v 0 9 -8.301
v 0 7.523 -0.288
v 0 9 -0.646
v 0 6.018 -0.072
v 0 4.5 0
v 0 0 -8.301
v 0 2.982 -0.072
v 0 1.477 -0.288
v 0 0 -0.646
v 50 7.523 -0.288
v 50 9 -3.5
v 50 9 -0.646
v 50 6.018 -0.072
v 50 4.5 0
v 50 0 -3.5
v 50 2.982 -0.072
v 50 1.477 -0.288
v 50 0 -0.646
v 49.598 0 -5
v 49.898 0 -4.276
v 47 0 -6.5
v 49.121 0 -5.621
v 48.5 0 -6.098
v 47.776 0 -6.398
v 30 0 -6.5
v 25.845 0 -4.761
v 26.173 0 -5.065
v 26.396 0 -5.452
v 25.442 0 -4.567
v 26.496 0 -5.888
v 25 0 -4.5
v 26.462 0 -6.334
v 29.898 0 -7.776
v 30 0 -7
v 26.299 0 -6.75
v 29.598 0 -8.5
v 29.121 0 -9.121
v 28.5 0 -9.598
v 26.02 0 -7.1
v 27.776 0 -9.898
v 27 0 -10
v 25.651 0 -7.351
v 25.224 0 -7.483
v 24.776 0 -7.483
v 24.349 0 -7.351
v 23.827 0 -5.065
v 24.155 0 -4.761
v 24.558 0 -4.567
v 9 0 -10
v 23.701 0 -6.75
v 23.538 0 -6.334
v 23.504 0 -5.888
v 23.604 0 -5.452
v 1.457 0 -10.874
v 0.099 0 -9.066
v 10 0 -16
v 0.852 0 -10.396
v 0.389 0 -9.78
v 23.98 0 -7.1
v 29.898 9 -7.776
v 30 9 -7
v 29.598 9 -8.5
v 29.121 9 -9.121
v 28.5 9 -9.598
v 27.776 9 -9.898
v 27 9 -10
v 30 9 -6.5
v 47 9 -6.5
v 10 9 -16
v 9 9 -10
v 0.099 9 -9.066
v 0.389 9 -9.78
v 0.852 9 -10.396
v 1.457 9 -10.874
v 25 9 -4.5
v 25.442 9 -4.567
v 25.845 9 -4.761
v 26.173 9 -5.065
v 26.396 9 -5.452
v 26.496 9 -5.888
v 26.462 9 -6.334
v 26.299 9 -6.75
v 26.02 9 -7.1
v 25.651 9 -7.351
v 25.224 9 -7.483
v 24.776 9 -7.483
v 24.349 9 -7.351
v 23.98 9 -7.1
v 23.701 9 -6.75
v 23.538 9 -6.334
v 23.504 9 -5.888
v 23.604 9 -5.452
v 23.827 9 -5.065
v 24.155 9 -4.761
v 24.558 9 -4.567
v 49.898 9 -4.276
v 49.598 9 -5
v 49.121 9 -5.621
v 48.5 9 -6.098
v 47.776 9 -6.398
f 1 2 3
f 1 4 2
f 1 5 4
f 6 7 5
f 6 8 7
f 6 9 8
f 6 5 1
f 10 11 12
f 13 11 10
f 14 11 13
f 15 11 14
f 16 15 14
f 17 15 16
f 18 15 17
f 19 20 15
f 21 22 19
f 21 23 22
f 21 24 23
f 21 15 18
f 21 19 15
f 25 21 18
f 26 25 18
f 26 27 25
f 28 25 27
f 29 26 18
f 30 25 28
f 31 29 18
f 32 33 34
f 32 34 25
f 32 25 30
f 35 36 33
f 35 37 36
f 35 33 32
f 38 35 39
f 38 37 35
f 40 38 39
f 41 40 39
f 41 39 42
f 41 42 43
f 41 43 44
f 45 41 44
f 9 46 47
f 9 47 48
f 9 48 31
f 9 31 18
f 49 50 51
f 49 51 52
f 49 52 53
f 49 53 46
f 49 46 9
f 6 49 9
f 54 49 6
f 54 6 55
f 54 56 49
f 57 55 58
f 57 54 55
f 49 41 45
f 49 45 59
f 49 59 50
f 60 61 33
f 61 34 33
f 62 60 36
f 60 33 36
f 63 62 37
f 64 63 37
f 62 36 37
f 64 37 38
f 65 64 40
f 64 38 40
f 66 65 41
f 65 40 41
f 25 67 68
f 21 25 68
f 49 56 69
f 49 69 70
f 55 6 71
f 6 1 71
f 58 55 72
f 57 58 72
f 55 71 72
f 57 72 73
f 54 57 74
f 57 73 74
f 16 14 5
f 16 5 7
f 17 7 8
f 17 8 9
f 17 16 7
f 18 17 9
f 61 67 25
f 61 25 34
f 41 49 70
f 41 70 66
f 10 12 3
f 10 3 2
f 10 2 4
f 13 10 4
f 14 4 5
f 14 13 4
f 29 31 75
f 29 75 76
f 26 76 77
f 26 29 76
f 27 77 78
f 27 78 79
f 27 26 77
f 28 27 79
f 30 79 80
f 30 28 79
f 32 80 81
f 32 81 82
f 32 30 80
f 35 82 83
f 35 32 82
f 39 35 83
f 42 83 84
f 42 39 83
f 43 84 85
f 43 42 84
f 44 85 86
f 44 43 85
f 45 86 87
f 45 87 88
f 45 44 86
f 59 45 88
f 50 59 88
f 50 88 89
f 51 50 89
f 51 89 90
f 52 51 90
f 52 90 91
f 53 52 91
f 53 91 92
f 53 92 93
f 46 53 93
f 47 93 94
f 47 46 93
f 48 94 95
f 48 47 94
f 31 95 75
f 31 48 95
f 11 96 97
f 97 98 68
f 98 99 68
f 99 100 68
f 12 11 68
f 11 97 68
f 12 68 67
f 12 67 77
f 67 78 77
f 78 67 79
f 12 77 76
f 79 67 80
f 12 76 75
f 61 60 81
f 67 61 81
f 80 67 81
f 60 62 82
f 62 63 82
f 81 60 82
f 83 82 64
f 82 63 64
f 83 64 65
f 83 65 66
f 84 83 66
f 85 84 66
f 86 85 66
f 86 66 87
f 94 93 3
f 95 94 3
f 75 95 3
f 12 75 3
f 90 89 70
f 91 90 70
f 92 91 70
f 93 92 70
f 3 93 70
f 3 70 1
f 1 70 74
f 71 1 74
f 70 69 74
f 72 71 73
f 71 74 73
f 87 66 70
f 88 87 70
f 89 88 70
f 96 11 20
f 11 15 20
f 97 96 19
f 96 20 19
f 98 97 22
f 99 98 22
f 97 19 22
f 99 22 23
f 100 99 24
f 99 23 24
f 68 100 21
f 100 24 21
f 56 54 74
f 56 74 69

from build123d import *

# Parameters (mm, degrees)
CROQUIS1_R              = 1.5
SALIENTE_EXTRUIR1_DEPTH = 9
CROQUIS2_W              = 20
CROQUIS2_H              = 3.5
CORTAR_EXTRUIR1_DEPTH   = 18
REDONDEO1_R             = 3
CORTAR_EXTRUIR2_DEPTH   = 51


with BuildPart() as part:
    # Croquis1 → Saliente-Extruir1 (new body)
    with BuildSketch(Plane(origin=(0, 0, 0), x_dir=(1, 0, 0), z_dir=(0, 1, 0))):
        Polygon((0, 0), (0, 10), (10, 16), (9, 10), (50, 10), (50, 0), align=None)
        with Locations((25, 6)):
            Circle(CROQUIS1_R, mode=Mode.SUBTRACT)
    extrude(amount=SALIENTE_EXTRUIR1_DEPTH)

    # Croquis2 → Cortar-Extruir1 (cut)
    with BuildSketch(Plane(origin=(0, 9, 0), x_dir=(1, 0, 0), z_dir=(0, 1, 0))):
        with Locations((40, 8.25)):
            Rectangle(CROQUIS2_W, CROQUIS2_H)
    extrude(amount=-CORTAR_EXTRUIR1_DEPTH, mode=Mode.SUBTRACT)

    # Redondeo1
    redondeo1_edges = [part.edges().sort_by_distance(p)[0] for p in [
        (0, 4.5, -10),
        (50, 4.5, -6.5),
        (30, 4.5, -10),
    ]]
    fillet(redondeo1_edges, radius=REDONDEO1_R)

    # Croquis4 → Cortar-Extruir2 (cut)
    with BuildSketch(Plane.ZY):
        with BuildLine():
            Line((-0.645847467, 0), (0, 0))
            Line((0, 0), (0, 4.500000055))
            ThreePointArc((0, 4.500000055), (-0.162284875, 2.226944872), (-0.645847467, 0))
        make_face()
        with BuildLine():
            ThreePointArc((-0.645847467, 9), (-0.162284883, 6.773055182), (0, 4.500000055))
            Line((0, 4.500000055), (0, 9))
            Line((0, 9), (-0.645847467, 9))
        make_face()
    extrude(amount=-CORTAR_EXTRUIR2_DEPTH, mode=Mode.SUBTRACT)


solid = part.part
